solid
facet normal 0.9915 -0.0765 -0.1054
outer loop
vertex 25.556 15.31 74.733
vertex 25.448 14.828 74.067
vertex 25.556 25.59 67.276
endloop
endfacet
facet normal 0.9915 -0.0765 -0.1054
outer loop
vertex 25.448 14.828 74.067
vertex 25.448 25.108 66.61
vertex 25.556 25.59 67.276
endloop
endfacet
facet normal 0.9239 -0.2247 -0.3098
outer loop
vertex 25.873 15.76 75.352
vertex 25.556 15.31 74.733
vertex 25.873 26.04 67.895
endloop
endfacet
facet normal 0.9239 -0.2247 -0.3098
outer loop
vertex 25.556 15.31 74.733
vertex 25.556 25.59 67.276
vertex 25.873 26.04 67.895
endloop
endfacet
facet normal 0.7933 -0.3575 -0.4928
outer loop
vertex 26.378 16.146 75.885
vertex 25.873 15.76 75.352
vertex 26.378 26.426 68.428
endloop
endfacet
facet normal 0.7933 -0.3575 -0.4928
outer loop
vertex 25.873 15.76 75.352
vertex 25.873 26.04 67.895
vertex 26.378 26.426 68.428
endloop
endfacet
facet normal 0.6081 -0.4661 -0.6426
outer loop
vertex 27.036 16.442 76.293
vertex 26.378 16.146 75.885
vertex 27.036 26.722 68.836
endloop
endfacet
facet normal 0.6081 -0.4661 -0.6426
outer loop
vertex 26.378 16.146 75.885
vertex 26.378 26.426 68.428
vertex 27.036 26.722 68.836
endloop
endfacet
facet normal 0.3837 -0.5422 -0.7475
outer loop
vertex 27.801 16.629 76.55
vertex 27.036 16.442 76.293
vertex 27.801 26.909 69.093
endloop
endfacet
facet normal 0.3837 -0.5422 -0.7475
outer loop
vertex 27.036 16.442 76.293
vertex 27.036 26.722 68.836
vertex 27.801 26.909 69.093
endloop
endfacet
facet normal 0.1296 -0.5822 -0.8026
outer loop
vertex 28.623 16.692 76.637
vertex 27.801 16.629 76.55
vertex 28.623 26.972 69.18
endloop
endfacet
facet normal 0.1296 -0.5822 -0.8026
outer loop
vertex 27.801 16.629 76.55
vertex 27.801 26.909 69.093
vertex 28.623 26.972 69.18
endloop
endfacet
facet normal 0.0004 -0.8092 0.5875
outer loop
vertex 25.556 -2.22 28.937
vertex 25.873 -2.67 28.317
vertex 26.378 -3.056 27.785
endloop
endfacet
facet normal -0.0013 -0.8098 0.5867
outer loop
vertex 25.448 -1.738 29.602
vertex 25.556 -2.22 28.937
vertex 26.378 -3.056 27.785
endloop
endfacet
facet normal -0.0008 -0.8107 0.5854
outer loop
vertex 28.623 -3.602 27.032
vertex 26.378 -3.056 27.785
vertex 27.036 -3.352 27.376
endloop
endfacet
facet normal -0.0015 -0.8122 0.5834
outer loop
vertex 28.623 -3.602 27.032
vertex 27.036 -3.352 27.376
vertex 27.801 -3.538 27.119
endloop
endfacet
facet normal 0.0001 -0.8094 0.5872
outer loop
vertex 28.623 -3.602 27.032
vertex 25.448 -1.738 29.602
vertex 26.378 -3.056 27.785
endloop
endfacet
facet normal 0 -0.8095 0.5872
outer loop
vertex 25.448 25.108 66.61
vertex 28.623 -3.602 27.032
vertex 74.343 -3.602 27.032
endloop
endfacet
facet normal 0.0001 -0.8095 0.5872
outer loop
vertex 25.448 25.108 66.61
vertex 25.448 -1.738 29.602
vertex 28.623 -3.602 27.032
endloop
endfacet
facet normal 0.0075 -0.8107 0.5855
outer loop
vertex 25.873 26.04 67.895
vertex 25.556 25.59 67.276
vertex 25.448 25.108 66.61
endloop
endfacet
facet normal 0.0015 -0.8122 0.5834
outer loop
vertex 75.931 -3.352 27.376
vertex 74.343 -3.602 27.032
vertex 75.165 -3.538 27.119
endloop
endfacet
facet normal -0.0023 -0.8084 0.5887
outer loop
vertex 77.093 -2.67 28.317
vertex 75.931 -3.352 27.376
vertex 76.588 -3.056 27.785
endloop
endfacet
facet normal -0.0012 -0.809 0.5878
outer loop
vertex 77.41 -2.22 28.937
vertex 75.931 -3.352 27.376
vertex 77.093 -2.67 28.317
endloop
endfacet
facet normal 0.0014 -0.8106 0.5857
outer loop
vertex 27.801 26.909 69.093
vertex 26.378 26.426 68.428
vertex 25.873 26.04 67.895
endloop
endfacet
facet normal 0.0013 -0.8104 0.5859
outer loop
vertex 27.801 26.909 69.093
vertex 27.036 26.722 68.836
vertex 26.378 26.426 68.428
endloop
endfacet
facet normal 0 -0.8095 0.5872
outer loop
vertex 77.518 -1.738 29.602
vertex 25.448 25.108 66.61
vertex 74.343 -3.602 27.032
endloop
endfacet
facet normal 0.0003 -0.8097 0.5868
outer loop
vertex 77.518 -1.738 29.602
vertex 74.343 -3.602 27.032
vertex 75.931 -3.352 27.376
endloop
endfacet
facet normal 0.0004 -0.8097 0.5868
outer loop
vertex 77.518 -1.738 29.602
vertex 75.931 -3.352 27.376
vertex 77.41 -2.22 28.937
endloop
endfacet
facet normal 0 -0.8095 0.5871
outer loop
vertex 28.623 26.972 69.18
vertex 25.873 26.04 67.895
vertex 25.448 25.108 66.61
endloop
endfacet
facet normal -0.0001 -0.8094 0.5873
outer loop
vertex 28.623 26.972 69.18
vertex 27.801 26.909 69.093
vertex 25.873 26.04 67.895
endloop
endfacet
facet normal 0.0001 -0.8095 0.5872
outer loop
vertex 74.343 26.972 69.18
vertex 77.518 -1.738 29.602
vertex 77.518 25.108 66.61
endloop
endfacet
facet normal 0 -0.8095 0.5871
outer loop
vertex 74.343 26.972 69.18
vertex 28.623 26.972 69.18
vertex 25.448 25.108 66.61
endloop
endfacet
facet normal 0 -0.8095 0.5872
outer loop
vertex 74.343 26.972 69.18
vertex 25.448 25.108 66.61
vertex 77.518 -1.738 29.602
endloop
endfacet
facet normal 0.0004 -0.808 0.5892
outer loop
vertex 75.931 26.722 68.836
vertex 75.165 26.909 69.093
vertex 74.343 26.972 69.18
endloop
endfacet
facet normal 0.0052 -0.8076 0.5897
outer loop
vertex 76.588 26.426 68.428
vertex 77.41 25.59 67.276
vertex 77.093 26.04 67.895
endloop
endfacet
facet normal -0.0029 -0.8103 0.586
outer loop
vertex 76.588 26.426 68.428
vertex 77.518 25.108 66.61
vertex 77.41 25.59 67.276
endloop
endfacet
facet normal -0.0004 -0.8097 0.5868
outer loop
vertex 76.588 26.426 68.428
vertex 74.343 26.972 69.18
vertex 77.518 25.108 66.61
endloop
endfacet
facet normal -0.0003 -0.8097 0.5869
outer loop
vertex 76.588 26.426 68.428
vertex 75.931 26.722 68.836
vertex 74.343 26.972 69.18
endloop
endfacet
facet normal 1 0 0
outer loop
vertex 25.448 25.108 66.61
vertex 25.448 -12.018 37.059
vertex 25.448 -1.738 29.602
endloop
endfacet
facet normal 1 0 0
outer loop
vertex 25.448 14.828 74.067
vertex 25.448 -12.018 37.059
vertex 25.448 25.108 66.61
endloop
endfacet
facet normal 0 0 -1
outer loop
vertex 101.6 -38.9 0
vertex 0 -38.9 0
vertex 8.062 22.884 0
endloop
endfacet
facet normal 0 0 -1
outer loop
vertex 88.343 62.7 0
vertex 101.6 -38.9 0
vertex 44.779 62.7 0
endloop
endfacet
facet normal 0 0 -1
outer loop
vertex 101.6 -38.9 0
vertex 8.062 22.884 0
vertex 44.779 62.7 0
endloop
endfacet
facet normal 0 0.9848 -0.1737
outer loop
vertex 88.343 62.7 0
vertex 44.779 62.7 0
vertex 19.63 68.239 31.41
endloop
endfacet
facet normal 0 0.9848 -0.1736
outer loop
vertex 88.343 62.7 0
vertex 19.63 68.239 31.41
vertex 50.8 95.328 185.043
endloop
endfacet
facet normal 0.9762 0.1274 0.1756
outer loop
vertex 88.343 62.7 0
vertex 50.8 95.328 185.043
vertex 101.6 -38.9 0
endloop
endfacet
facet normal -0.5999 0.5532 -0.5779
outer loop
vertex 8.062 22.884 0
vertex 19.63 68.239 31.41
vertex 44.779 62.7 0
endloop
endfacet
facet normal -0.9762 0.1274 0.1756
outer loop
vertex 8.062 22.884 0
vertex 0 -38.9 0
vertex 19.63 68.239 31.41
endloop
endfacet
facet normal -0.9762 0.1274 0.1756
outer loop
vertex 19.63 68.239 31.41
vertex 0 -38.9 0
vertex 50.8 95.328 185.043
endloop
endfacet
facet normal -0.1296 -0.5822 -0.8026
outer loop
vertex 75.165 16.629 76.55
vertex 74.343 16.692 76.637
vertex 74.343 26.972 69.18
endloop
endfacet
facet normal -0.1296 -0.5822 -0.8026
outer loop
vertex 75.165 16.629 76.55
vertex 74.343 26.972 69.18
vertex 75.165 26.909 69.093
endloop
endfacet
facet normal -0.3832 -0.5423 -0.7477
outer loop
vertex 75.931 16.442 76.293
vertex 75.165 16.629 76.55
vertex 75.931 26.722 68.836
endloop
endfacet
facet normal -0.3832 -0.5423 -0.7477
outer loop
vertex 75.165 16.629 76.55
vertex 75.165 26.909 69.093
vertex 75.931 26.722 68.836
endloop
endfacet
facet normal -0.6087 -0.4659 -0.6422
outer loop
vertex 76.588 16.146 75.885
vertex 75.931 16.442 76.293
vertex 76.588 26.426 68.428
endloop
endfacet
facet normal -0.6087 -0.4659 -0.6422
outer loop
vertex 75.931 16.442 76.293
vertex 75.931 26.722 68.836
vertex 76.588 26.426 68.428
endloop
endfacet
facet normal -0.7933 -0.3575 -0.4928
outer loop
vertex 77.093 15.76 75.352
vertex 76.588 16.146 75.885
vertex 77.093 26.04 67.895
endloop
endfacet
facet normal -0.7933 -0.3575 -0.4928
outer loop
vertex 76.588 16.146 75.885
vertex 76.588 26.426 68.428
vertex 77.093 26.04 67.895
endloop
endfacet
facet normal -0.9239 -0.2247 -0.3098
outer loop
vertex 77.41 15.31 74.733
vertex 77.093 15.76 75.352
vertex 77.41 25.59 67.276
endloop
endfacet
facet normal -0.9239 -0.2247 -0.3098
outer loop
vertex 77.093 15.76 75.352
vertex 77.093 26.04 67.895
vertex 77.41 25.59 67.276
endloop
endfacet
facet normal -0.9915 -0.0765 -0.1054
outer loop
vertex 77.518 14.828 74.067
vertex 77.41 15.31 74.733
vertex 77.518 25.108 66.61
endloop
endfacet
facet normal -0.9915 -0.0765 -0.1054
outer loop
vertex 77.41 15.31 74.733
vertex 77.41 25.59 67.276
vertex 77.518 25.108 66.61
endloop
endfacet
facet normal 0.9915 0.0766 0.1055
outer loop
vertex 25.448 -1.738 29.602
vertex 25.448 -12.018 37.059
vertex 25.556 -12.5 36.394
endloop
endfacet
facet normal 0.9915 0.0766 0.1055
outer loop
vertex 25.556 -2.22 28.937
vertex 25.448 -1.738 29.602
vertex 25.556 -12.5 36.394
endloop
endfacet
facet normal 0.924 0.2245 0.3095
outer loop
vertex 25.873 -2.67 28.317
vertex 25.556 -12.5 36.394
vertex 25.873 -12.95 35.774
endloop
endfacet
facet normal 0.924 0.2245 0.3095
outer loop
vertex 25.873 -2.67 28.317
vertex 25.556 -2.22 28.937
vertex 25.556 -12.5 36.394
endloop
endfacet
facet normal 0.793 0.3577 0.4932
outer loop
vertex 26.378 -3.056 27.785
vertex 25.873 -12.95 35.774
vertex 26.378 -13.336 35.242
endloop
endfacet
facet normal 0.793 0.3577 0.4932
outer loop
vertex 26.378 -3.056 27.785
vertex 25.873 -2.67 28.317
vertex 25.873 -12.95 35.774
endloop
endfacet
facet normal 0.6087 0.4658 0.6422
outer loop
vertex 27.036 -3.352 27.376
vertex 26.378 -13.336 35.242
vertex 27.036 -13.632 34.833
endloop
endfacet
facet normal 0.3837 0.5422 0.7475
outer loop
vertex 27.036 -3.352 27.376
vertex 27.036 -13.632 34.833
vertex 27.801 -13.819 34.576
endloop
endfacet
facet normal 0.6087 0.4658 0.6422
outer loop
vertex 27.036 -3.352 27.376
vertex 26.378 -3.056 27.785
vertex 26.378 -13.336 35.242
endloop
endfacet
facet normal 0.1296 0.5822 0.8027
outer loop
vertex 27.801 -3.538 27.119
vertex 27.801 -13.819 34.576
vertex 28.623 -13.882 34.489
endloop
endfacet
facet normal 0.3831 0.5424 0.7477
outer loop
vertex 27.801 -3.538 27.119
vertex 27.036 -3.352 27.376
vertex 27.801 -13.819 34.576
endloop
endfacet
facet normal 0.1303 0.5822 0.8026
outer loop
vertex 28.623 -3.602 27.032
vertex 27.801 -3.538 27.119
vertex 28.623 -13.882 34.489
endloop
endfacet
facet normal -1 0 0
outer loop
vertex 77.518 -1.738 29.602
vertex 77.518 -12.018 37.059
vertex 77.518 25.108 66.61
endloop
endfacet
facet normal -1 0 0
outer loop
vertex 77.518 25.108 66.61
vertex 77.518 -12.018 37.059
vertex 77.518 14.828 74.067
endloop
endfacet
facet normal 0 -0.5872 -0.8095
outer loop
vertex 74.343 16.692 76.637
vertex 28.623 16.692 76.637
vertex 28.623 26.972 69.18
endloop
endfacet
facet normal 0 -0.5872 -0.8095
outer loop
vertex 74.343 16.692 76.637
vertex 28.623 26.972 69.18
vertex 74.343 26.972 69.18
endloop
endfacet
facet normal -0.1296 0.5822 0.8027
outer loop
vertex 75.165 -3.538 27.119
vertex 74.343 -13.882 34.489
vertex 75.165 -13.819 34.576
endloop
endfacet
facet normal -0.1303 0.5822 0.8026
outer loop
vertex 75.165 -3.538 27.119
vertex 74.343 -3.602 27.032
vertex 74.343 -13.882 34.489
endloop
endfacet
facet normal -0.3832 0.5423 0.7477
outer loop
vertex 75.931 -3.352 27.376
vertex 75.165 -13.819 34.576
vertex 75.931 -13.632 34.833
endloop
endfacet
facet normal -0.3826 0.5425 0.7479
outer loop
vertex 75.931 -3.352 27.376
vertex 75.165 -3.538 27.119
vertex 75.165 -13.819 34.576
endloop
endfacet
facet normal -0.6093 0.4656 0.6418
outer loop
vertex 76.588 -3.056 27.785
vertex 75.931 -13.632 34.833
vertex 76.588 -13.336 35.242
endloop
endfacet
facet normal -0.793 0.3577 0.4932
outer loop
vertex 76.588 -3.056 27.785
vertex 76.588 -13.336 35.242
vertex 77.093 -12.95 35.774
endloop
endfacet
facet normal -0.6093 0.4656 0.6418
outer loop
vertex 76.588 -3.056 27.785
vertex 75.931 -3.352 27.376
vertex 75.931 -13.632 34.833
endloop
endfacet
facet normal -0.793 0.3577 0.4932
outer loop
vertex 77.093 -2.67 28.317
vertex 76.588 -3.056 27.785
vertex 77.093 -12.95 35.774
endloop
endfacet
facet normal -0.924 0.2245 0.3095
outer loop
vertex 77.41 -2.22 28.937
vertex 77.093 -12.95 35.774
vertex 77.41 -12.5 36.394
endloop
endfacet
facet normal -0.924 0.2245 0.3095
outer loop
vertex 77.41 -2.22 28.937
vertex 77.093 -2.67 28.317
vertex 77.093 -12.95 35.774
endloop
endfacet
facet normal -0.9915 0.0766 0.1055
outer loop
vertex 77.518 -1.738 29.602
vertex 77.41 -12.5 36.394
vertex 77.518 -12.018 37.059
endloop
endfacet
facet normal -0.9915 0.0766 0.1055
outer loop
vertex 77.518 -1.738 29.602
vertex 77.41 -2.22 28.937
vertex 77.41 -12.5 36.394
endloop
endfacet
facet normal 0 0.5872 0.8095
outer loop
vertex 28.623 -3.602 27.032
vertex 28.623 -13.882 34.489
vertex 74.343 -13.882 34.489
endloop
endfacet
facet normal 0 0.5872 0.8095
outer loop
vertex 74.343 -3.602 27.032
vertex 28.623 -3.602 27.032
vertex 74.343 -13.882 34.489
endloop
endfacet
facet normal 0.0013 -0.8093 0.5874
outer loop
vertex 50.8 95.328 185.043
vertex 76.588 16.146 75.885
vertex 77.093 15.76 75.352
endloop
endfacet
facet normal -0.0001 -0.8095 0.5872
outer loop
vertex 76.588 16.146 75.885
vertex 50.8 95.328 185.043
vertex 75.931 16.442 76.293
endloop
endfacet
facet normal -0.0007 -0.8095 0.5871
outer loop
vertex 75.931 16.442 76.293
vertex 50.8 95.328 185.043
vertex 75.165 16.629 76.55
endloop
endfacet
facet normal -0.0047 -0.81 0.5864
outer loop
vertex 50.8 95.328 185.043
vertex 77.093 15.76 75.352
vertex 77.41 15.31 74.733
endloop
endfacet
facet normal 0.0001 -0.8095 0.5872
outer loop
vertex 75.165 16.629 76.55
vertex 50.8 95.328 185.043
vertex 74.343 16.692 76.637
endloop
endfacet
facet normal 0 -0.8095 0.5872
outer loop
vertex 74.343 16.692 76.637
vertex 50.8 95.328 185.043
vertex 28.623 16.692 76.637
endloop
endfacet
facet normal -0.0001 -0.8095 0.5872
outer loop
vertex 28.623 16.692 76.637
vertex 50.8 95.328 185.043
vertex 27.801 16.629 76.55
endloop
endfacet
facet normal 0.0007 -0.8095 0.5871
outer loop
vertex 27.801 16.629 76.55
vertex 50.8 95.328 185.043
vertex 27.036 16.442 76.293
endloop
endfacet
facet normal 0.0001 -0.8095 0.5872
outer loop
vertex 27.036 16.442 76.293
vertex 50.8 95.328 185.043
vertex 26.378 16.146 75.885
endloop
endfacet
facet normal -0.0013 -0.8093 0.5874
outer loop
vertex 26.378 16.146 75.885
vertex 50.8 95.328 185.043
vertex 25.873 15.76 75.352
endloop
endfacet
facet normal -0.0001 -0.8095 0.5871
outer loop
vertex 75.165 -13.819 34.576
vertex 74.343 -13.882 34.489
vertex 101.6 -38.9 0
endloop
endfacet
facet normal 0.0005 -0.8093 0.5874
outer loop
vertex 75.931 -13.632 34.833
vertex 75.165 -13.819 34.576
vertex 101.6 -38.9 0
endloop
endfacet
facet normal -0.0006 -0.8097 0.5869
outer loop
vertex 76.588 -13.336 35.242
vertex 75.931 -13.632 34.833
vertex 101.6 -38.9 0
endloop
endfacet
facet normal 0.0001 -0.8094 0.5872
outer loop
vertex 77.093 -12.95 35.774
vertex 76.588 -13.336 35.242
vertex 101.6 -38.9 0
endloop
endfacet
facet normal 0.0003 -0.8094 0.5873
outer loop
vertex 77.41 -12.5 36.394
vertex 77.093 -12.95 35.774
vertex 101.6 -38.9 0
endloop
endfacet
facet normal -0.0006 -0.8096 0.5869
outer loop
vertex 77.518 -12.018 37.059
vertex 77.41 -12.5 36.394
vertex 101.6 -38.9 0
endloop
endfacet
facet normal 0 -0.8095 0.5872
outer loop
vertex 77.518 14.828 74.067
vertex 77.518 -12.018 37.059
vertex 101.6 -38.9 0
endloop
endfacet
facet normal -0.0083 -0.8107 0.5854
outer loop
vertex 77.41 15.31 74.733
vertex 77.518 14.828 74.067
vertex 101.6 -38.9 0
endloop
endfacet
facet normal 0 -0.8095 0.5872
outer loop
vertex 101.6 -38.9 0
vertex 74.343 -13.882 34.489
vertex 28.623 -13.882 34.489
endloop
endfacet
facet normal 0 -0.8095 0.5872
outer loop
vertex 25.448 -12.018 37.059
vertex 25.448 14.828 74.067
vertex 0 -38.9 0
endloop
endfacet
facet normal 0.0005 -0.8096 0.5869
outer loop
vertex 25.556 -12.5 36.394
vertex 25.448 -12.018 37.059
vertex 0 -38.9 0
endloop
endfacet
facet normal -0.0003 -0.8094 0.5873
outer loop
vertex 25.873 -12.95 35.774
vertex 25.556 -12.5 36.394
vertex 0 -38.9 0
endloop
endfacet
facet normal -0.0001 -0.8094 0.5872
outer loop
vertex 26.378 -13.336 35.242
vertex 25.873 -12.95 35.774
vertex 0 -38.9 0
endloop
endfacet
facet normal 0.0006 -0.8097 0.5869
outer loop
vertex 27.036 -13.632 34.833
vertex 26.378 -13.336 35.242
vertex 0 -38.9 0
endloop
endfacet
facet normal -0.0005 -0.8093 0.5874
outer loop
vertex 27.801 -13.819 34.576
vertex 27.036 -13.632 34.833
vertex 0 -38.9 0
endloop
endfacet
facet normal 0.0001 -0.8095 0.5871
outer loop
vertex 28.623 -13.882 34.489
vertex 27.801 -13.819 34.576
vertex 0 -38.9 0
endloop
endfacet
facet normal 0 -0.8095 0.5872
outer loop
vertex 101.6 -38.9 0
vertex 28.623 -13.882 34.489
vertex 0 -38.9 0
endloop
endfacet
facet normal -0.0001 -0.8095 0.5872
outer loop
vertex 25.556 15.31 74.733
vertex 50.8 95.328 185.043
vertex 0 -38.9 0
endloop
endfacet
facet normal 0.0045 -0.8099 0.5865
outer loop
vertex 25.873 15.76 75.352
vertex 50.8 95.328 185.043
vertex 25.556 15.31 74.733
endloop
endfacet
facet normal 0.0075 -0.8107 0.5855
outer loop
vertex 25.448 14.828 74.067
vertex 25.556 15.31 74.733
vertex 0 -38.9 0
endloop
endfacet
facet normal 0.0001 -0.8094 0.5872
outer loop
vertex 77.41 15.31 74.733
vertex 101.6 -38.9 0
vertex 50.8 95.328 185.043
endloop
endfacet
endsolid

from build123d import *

# Parameters (mm, degrees)
F1_DEPTH  = 101.6
F3_DEPTH  = 108.6532940183
F4_W      = 52.07
F4_H      = 52.07
F5_DEPTH  = 12.7
F6_R      = 3.175
F7_R      = 3.175
F10_W     = 114.2207605299
F10_H     = 103.8881577551
F11_DEPTH = 25.4


with BuildPart() as f1:
    # F0 (on Right) → F1 (new body)
    with BuildSketch(Plane.YZ):
        Polygon((95.3280799156, 185.0426944046), (-38.8999396909, 0), (62.7000603091, 0), align=None)
    extrude(amount=F1_DEPTH)

    # F2 (on face) → F3 (cut, through all)
    with BuildSketch(Plane(origin=(0, -25.4882702356, 18.4889225048), x_dir=(1, 0, 0), z_dir=(0, -0.8094606054, 0.587174189))):
        Polygon((0, 205.7589594597), (0, -22.8410405403), (50.8, 205.7589594597), align=None)
        Polygon((101.6, 205.7589594597), (50.8, 205.7589594597), (101.6, -22.8410405403), align=None)
    extrude(amount=-F3_DEPTH, mode=Mode.SUBTRACT)

    # F4 (on face) → F5 (cut)
    with BuildSketch(Plane(origin=(0, -25.4882702356, 18.4889225048), x_dir=(1, 0, 0), z_dir=(0, -0.8094606054, 0.587174189))):
        with Locations((51.483128581, 45.8012033367)):
            Rectangle(F4_W, F4_H)
    extrude(amount=-F5_DEPTH, mode=Mode.SUBTRACT)

    # F6
    f6_edges = [f1.edges().sort_by_distance(p)[0] for p in [
        (25.448129, 21.832169, 72.908943),
    ]]
    fillet(f6_edges, radius=F6_R)

    # F7
    f7_edges = [f1.edges().sort_by_distance(p)[0] for p in [
        (25.448129, -8.741991, 30.760329),
        (77.518129, -8.741991, 30.760329),
        (77.518129, 21.832169, 72.908943),
    ]]
    fillet(f7_edges, radius=F7_R)

    # F10 (on face) → F11 (cut)
    with BuildSketch(Plane(origin=(-4.6941337345, 4.3288858466, -4.5218095202), x_dir=(-0.3984565906, -0.8330111765, -0.3838290314), z_dir=(-0.5999369127, 0.5532561612, -0.5779129008))):
        with Locations((-60.2949896129, -21.5842779726)):
            Rectangle(F10_W, F10_H)
    extrude(amount=F11_DEPTH, mode=Mode.SUBTRACT)


solid = f1.part
